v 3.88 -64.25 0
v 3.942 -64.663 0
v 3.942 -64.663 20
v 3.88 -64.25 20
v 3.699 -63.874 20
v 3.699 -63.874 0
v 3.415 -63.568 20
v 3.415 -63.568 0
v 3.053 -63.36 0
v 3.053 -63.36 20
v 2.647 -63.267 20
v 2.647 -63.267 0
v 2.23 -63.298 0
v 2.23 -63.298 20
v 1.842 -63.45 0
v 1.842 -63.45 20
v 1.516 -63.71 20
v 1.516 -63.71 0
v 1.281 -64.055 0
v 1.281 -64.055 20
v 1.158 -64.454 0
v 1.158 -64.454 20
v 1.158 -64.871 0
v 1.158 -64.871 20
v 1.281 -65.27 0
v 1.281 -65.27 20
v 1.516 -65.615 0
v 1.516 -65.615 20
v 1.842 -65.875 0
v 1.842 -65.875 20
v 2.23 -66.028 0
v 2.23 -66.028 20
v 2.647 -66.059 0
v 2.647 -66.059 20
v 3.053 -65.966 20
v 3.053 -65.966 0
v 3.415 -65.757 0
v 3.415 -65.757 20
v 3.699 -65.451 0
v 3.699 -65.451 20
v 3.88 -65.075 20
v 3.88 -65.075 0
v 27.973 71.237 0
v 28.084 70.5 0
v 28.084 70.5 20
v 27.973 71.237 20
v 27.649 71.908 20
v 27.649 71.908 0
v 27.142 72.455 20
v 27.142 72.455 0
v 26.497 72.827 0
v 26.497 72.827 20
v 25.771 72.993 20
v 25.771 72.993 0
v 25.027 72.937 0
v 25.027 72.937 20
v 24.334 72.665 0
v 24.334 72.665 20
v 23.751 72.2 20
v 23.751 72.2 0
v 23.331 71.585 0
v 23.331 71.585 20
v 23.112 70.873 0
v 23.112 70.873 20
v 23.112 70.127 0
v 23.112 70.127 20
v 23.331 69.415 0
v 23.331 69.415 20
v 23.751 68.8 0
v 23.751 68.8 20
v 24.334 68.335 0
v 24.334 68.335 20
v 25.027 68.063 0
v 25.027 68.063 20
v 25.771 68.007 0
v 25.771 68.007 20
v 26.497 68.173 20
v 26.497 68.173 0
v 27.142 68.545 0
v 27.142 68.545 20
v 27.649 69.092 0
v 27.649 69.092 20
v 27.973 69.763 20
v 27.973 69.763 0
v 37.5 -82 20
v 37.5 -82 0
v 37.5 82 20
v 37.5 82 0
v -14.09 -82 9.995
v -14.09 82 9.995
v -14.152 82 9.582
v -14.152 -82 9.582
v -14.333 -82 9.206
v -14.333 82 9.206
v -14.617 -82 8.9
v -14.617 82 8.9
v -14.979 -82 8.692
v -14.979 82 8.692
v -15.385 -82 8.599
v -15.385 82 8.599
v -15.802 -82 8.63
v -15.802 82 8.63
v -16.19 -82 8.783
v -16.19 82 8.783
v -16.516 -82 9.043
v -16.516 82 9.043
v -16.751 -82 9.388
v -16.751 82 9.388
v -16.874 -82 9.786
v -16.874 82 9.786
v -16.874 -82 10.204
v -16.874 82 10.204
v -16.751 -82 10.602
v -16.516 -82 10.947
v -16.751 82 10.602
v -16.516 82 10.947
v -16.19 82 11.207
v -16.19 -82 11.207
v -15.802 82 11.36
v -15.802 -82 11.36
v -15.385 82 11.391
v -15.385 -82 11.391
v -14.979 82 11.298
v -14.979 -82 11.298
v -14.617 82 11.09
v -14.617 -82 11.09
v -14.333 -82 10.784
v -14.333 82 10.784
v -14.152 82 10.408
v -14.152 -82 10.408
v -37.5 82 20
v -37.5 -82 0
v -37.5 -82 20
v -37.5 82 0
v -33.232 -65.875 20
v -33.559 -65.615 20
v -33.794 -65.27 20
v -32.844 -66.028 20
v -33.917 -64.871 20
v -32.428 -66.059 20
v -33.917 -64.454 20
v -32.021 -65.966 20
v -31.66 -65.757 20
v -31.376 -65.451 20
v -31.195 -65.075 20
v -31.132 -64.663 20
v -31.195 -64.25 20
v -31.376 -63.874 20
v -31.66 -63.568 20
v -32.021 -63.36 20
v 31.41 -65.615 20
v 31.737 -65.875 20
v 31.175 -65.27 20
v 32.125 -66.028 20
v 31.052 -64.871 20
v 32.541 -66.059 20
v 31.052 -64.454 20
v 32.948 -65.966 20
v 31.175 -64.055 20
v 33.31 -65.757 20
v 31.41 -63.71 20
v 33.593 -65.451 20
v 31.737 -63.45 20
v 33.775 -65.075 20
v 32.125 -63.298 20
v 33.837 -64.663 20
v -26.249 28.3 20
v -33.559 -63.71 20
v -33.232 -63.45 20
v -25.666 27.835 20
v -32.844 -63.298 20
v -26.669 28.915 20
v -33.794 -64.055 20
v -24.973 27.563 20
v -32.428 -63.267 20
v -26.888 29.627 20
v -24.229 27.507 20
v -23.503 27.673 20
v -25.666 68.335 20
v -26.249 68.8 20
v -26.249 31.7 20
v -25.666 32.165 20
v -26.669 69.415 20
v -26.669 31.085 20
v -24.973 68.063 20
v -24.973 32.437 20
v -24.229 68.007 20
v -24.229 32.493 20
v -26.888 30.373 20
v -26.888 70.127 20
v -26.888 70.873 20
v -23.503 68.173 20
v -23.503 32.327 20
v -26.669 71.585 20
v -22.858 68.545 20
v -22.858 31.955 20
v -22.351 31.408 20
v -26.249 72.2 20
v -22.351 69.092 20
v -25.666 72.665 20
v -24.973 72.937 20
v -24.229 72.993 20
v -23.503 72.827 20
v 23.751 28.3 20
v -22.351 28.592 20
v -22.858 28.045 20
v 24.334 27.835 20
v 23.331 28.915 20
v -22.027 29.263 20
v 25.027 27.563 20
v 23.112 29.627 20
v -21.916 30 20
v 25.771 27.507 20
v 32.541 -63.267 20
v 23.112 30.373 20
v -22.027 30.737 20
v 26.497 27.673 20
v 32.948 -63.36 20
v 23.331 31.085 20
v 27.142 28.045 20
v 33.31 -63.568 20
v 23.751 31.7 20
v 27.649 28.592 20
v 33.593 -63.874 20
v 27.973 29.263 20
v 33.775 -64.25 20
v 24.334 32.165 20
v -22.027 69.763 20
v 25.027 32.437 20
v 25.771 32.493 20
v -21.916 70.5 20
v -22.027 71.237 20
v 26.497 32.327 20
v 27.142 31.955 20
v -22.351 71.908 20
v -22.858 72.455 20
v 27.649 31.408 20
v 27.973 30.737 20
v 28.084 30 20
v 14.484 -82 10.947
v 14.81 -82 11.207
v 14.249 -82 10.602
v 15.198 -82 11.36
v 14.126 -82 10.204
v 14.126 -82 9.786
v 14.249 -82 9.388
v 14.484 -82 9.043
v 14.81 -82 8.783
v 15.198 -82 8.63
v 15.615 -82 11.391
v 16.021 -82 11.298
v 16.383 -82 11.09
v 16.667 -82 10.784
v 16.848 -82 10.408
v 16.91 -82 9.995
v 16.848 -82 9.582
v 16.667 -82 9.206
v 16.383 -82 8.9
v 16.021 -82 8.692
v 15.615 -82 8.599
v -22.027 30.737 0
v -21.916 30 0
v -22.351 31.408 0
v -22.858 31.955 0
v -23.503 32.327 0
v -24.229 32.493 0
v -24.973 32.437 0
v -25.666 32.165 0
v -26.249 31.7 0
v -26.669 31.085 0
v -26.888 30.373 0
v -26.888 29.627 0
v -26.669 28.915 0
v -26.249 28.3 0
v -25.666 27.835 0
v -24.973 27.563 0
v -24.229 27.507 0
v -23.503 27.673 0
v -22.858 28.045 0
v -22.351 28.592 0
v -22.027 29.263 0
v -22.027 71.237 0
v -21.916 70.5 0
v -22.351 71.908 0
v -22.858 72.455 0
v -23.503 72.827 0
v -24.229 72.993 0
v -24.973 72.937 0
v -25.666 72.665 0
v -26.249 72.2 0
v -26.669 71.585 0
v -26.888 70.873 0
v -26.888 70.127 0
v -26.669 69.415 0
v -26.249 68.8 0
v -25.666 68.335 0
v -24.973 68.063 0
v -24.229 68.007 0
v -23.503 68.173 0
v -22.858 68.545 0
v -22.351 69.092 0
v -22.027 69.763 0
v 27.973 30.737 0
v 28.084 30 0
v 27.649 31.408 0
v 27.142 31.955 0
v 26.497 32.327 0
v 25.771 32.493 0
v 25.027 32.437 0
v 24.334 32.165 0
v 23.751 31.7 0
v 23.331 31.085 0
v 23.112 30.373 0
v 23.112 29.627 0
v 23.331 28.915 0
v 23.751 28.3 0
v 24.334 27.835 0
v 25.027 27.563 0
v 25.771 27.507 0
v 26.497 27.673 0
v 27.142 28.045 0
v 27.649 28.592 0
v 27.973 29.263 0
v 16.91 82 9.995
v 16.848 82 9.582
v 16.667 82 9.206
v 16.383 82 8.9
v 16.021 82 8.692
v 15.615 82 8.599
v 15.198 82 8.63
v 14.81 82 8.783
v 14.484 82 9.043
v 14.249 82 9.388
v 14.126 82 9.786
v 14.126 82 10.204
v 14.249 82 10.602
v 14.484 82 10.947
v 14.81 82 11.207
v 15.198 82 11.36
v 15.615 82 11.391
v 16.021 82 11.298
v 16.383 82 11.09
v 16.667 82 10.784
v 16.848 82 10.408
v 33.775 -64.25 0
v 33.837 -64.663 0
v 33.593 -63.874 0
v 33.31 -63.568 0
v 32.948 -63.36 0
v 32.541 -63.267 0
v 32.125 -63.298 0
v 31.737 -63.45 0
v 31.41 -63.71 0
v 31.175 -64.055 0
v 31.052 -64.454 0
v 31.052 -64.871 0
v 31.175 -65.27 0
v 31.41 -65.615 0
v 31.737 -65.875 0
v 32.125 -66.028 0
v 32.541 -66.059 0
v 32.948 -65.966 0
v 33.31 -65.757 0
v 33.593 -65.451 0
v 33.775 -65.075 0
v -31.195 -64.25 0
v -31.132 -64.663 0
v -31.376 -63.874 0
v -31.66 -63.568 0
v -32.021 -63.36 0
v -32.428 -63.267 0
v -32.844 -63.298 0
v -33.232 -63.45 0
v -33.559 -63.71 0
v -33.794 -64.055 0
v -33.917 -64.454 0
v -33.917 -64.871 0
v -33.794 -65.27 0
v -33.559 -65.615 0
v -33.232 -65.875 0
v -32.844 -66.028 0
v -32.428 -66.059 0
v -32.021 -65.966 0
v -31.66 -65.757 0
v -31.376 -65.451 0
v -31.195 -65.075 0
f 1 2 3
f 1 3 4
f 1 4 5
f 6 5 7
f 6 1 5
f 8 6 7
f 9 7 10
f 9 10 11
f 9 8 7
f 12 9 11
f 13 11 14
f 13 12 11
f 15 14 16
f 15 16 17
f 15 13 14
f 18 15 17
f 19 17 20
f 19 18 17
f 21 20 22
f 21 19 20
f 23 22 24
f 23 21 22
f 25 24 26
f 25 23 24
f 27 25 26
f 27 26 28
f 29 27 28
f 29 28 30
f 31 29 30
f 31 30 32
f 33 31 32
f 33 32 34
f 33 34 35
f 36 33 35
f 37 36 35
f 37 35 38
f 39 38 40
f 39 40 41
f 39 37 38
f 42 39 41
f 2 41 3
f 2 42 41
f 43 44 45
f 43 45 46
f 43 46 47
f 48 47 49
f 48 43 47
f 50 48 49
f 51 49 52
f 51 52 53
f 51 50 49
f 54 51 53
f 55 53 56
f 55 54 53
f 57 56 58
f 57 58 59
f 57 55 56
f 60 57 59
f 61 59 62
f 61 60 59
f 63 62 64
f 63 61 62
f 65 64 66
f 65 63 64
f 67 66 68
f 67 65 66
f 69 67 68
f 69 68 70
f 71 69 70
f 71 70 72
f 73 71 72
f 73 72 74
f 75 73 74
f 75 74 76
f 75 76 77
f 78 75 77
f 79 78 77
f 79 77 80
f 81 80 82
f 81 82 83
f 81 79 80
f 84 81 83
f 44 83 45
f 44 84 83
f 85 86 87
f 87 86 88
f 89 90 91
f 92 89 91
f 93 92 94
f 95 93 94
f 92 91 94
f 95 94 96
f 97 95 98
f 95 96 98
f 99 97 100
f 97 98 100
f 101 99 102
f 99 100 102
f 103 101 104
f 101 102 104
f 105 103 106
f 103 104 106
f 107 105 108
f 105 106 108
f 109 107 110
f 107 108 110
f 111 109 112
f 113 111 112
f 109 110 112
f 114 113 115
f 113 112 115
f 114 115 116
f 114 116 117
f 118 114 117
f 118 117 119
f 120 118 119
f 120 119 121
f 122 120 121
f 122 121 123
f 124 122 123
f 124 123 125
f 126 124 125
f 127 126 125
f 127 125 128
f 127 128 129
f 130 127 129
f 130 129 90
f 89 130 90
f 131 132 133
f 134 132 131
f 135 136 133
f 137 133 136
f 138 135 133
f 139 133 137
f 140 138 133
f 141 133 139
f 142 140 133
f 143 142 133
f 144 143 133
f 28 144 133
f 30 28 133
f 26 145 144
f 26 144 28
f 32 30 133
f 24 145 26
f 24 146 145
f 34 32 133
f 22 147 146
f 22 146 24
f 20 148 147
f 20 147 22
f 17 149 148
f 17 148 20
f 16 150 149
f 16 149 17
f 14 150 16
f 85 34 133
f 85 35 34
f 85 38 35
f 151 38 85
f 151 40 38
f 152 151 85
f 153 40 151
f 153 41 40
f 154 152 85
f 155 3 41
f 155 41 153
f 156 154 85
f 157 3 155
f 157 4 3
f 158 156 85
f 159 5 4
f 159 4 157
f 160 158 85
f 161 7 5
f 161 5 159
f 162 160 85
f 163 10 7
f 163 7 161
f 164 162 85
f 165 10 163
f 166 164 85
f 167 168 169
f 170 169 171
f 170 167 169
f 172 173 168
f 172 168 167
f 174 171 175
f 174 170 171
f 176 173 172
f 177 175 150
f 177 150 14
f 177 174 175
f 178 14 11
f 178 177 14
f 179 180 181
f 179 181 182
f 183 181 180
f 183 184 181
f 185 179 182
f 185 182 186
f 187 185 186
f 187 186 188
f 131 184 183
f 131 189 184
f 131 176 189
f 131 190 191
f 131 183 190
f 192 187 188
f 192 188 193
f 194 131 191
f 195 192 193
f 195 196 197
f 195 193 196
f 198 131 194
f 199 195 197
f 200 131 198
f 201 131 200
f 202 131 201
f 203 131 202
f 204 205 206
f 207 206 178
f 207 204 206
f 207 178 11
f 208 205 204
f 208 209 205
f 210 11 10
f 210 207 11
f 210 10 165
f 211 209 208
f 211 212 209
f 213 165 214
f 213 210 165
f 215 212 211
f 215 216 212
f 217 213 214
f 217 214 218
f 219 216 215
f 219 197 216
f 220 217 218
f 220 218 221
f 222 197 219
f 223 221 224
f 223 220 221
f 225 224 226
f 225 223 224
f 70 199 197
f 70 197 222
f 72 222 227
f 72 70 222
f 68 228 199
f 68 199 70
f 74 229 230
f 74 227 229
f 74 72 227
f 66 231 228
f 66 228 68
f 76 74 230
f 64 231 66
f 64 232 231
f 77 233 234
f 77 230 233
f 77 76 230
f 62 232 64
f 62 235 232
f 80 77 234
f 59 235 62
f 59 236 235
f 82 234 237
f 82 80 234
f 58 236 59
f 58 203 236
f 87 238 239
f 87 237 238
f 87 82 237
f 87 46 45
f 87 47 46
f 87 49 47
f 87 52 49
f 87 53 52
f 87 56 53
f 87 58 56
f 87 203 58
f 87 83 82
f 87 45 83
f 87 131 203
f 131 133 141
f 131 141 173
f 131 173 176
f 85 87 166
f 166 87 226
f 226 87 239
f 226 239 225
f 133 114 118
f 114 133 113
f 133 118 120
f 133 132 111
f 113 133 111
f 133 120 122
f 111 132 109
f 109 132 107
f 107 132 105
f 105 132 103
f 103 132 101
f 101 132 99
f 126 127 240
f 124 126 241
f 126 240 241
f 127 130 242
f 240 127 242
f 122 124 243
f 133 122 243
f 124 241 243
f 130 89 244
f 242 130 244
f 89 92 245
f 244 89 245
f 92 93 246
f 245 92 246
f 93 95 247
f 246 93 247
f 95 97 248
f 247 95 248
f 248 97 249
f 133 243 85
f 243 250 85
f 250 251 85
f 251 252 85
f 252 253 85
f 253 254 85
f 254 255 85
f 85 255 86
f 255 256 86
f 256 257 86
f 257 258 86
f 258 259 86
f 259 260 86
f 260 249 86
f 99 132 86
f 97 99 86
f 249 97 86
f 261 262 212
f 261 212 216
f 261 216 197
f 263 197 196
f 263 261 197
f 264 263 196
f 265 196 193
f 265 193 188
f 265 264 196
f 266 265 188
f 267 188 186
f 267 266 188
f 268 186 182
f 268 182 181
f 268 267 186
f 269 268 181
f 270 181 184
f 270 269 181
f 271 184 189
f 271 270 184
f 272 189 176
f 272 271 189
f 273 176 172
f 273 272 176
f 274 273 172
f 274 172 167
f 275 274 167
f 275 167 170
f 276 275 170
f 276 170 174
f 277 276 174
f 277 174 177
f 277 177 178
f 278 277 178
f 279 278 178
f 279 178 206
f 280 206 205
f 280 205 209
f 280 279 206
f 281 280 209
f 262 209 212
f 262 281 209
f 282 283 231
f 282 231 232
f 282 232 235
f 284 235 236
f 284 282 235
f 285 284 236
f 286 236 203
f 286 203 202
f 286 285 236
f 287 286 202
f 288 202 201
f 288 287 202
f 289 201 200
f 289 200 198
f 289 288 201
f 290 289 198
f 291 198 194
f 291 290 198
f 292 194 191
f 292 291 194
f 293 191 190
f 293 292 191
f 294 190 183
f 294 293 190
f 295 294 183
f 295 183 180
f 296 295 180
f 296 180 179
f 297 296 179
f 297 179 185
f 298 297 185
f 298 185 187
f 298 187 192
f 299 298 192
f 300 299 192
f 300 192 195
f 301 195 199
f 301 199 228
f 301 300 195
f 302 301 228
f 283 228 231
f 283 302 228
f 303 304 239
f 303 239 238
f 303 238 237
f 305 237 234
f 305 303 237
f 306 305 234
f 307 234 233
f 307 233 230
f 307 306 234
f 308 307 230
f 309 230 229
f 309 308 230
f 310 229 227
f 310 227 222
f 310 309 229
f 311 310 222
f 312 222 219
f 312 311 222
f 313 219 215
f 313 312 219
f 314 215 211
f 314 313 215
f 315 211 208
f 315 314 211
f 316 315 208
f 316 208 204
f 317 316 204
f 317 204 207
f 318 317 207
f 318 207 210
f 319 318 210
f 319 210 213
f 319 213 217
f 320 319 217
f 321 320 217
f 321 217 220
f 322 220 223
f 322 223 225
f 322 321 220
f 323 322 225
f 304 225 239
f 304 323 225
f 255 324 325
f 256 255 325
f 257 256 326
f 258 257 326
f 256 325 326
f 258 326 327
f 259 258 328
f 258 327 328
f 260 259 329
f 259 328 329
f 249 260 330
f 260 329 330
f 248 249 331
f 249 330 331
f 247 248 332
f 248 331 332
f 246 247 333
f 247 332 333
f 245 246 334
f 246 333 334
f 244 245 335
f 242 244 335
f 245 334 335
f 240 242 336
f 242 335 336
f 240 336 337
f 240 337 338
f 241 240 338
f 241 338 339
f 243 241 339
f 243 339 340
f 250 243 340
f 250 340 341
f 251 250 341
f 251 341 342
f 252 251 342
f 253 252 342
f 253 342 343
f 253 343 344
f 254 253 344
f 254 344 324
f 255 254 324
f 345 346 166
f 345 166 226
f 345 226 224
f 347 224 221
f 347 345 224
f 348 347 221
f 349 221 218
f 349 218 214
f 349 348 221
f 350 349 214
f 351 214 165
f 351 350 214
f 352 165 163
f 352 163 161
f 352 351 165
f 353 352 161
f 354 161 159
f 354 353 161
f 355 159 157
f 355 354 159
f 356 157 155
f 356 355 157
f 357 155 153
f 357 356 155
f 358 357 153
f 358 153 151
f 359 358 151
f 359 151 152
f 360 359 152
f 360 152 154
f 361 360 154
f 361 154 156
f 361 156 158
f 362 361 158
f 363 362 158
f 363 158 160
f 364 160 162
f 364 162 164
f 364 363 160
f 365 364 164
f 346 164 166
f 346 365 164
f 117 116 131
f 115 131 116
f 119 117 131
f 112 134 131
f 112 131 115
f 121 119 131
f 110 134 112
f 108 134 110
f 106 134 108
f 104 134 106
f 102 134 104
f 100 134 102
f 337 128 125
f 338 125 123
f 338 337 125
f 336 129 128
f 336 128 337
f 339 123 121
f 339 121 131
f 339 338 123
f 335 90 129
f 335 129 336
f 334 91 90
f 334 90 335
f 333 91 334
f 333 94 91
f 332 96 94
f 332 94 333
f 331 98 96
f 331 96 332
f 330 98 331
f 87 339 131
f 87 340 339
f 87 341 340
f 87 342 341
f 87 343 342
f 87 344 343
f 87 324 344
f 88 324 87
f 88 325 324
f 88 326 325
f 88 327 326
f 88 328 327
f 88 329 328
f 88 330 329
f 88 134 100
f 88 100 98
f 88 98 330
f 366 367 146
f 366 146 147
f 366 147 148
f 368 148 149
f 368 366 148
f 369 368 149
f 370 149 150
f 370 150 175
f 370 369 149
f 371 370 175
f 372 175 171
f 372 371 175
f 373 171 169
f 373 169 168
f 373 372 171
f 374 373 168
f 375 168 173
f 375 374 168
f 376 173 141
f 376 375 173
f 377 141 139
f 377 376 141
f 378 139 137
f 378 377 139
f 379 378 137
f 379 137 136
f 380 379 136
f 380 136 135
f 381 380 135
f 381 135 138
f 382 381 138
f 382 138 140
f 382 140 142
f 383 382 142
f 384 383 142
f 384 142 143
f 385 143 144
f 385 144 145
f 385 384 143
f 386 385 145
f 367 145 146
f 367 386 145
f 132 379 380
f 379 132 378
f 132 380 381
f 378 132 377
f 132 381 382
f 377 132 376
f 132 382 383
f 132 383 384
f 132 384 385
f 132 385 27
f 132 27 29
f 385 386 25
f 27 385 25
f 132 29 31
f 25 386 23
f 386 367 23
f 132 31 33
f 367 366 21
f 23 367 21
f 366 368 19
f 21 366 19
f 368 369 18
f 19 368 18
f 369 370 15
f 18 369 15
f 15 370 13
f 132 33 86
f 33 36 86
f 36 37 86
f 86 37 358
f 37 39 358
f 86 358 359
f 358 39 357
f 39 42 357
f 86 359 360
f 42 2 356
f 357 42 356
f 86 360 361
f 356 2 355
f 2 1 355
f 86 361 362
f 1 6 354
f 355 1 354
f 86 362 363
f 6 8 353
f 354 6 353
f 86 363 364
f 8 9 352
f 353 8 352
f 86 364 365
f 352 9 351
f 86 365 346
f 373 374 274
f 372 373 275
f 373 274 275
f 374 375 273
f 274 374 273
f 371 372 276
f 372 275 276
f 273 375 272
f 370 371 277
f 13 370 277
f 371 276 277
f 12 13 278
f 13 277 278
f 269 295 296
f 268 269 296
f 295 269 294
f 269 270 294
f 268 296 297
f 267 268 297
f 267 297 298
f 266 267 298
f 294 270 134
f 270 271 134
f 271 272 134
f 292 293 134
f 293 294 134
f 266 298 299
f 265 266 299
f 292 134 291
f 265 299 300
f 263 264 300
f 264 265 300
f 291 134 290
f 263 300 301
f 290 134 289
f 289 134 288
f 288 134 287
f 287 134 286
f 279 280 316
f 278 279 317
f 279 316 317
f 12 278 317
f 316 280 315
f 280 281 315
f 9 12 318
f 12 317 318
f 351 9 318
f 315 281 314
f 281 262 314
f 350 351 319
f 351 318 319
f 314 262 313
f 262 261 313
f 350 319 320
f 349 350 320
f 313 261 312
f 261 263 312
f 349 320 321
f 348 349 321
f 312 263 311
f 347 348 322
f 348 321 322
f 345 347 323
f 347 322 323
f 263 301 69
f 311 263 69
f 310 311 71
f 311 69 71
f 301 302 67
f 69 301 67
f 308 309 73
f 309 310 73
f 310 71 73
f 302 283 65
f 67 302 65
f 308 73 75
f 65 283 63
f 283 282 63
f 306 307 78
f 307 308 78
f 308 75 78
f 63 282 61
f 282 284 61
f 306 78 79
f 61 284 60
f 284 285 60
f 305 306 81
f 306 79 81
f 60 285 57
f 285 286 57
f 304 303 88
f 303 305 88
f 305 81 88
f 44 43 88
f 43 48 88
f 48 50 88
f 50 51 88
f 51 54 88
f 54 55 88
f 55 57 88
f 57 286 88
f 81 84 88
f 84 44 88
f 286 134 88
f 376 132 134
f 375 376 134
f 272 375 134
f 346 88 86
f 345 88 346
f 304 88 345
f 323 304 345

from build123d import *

# Parameters (mm, degrees)
SKETCH1_W           = 75
SKETCH1_H           = 164
SKETCH1_R           = 1.4
SKETCH1_R_2         = 2.5
BOSS_EXTRUDE1_DEPTH = 20
SKETCH2_R           = 1.4
CUT_EXTRUDE1_DEPTH  = 165


with BuildPart() as part:
    # Sketch1 → Boss-Extrude1 (new body)
    with BuildSketch(Plane.XY):
        Rectangle(SKETCH1_W, SKETCH1_H)
        with Locations((-32.5324139, -64.662730375)):
            Circle(SKETCH1_R, mode=Mode.SUBTRACT)
        with Locations((32.436706201, -64.662730375)):
            Circle(SKETCH1_R, mode=Mode.SUBTRACT)
        with Locations((2.542, -64.662730375)):
            Circle(SKETCH1_R, mode=Mode.SUBTRACT)
        with Locations((25.583768895, 30)):
            Circle(SKETCH1_R_2, mode=Mode.SUBTRACT)
        with Locations((-24.416231105, 70.5)):
            Circle(SKETCH1_R_2, mode=Mode.SUBTRACT)
        with Locations((25.583768895, 70.5)):
            Circle(SKETCH1_R_2, mode=Mode.SUBTRACT)
        with Locations((-24.416231105, 30)):
            Circle(SKETCH1_R_2, mode=Mode.SUBTRACT)
    extrude(amount=BOSS_EXTRUDE1_DEPTH)

    # Sketch2 → Cut-Extrude1 (cut, through all)
    with BuildSketch(Plane(origin=(0, 82, 0), x_dir=(1, 0, 0), z_dir=(0, 1, 0))):
        with Locations((15.509889123, -9.995038215)):
            Circle(SKETCH2_R)
        with Locations((-15.490110877, -9.995038215)):
            Circle(SKETCH2_R)
    extrude(amount=-CUT_EXTRUDE1_DEPTH, mode=Mode.SUBTRACT)


solid = part.part
